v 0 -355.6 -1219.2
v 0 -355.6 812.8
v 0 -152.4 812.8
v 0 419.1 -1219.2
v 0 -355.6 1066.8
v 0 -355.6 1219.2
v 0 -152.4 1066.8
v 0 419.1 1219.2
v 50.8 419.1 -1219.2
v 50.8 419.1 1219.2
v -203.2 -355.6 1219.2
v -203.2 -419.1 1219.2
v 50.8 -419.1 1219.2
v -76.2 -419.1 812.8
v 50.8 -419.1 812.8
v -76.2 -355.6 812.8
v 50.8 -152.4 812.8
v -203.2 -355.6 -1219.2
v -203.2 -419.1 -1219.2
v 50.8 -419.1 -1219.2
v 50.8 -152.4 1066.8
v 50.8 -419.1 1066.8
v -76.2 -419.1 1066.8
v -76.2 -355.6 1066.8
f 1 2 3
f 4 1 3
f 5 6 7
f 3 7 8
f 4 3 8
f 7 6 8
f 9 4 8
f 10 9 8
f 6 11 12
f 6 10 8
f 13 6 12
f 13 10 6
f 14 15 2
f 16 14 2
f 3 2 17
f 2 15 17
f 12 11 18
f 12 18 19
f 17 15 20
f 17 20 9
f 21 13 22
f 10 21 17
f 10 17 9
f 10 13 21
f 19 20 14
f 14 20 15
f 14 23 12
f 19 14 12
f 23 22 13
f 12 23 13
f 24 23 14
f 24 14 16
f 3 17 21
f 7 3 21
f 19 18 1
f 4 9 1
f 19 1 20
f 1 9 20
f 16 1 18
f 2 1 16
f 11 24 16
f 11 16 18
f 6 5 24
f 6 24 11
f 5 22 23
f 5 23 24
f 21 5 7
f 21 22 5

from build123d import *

# Parameters (mm, degrees)
F0_W     = 838.2
F0_H     = 2438.4
F1_DEPTH = 50.8
F2_W     = 63.5
F2_H     = 2438.4
F3_DEPTH = 203.2
F5_W     = 304.8
F5_H     = 254
F6_DEPTH = 127


with BuildPart() as f1:
    # F0 (on Right) → F1 (new body)
    with BuildSketch(Plane.YZ):
        Rectangle(F0_W, F0_H)
    extrude(amount=F1_DEPTH)

    # F2 (on face) → F3 (join)
    with BuildSketch(Plane(origin=(0, 0, 0), x_dir=(0, -1, 0), z_dir=(-1, 0, 0))):
        with Locations((387.35, 0)):
            Rectangle(F2_W, F2_H)
    extrude(amount=F3_DEPTH)

    # F5 (on face) → F6 (cut)
    with BuildSketch(Plane.YZ.offset(50.8)):
        with Locations((-304.8, 939.8)):
            Rectangle(F5_W, F5_H)
    extrude(amount=-F6_DEPTH, mode=Mode.SUBTRACT)


solid = f1.part
